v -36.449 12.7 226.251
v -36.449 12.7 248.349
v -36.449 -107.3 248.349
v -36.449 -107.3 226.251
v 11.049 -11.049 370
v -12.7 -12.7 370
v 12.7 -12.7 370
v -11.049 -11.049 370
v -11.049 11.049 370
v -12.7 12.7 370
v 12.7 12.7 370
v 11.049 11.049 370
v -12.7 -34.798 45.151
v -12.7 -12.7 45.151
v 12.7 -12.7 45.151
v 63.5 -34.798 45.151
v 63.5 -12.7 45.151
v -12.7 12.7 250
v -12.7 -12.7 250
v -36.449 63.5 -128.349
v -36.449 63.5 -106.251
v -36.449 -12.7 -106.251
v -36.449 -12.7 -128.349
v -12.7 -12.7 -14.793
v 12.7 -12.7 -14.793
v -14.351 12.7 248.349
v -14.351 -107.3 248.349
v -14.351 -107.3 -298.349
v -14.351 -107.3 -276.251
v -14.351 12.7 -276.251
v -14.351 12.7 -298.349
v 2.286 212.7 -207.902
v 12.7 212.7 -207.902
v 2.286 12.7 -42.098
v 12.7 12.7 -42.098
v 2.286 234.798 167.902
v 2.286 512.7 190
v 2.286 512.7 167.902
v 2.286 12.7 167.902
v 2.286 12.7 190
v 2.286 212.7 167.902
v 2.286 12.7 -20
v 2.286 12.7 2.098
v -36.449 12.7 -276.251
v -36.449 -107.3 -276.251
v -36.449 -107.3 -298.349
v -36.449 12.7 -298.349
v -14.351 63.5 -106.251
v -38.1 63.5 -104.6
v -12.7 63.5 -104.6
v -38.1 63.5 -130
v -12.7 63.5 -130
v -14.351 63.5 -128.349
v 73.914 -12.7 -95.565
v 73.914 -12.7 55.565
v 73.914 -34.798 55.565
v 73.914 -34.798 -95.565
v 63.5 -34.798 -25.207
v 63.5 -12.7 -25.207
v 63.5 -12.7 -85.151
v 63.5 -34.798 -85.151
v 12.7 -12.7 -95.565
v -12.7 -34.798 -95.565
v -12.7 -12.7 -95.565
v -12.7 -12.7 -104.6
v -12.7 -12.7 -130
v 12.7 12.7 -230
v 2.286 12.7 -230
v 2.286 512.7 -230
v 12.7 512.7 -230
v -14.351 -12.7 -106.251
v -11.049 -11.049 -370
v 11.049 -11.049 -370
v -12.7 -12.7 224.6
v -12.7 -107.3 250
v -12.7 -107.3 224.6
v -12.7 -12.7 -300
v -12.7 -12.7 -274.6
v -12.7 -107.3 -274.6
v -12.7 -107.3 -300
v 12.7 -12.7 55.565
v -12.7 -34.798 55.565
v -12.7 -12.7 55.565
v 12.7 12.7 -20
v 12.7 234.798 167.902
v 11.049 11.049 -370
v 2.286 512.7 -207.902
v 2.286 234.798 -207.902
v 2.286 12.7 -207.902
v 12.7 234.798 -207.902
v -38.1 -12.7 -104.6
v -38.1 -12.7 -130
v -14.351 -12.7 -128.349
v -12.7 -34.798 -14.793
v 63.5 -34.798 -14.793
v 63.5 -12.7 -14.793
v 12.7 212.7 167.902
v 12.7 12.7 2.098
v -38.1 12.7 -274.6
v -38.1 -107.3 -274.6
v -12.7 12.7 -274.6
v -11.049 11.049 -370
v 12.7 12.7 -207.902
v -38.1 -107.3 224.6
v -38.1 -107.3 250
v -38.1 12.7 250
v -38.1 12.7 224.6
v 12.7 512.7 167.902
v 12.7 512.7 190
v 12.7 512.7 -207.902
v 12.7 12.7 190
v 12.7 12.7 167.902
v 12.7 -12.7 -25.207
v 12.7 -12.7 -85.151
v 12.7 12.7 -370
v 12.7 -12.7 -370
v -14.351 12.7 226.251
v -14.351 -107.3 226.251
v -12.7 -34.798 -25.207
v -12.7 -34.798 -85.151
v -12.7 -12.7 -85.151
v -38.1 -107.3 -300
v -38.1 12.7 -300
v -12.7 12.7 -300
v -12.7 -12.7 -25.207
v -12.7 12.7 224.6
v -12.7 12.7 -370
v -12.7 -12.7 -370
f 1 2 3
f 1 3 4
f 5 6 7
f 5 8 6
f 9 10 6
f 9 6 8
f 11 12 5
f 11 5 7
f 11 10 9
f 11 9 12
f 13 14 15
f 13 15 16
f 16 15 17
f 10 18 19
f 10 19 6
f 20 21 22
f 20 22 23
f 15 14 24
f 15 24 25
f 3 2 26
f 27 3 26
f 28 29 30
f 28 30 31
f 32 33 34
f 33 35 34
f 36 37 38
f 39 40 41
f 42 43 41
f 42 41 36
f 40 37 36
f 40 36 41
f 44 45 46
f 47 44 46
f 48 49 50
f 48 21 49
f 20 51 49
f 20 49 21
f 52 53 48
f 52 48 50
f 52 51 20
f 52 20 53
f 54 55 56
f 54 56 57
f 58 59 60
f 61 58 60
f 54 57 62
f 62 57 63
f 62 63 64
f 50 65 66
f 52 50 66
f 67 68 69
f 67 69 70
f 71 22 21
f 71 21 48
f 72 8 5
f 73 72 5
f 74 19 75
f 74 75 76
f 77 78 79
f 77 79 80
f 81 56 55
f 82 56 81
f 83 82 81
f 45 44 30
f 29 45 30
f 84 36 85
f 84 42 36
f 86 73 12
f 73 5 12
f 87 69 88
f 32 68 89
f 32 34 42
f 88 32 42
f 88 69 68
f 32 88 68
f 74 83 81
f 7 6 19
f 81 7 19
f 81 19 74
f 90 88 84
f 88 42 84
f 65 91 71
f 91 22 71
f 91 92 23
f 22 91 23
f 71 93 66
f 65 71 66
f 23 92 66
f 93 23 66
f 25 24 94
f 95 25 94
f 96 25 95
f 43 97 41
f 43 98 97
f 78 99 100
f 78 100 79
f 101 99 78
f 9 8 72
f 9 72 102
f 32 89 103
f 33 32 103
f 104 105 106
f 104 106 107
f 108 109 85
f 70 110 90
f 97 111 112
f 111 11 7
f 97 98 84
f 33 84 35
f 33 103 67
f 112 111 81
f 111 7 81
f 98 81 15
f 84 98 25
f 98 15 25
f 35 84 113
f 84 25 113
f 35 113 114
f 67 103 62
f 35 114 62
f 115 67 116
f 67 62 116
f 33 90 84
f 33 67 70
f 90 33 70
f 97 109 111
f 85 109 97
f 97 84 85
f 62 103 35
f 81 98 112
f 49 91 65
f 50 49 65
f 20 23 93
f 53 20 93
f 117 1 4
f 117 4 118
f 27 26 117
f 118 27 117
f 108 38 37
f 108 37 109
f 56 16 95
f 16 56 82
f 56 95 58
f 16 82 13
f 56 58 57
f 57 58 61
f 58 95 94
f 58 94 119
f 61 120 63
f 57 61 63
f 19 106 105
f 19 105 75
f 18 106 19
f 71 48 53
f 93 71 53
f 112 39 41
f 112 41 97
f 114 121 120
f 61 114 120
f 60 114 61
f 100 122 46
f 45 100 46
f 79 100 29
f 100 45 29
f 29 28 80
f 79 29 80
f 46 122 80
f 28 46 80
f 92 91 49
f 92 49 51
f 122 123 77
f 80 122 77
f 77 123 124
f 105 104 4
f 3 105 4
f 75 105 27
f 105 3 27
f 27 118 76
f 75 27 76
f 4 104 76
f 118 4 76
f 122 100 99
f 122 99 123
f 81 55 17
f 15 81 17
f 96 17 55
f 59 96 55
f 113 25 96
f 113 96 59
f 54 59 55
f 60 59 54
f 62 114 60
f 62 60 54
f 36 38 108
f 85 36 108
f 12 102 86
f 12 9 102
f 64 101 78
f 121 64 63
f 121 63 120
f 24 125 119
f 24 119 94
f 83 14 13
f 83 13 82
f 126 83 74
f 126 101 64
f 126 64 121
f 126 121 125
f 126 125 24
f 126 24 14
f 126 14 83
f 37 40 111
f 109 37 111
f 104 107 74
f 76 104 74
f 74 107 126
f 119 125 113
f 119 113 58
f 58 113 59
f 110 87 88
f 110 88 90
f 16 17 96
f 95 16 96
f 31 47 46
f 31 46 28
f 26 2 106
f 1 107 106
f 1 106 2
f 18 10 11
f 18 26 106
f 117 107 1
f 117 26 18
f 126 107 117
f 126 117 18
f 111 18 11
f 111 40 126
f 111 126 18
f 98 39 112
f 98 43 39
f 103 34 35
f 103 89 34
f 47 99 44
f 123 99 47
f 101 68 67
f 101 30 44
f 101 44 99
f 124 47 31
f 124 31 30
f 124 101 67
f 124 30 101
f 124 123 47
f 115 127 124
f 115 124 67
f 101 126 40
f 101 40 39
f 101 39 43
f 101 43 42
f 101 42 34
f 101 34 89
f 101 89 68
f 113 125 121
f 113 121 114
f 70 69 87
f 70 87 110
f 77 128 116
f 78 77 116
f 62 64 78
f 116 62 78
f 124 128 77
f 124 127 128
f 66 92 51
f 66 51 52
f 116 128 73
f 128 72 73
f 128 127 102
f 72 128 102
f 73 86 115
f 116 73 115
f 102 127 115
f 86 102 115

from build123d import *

# Parameters (mm, degrees)
SKETCH1_W                = 25.4
SKETCH1_H                = 25.4
SKETCH1_W_2              = 22.098
SKETCH1_H_2              = 22.098
BOSS_EXTRUDE1_DEPTH      = 370
SKETCH2_W                = 10.414
SKETCH2_H                = 22.098
BOSS_EXTRUDE2_DEPTH      = 500
SKETCH11_W               = 76.2
SKETCH11_H               = 10.414
BOSS_EXTRUDE3_DEPTH      = 22.098
SKETCH13_W               = 151.13
SKETCH13_H               = 22.098
BOSS_EXTRUDE4_DEPTH      = 10.414
SKETCH14_W               = 25.4
SKETCH14_H               = 25.4
SKETCH14_W_2             = 22.098
SKETCH14_H_2             = 22.098
BOSS_EXTRUDE5_DEPTH      = 120
BOSS_EXTRUDE6_DEPTH      = 50.8
BOSS_EXTRUDE6_DEPTH_BACK = 25.4
SKETCH15_W               = 25.4
SKETCH15_H               = 25.4
SKETCH15_W_2             = 22.098
SKETCH15_H_2             = 22.098


with BuildPart() as part:
    # Sketch1 → Boss-Extrude1 (new, symmetric)
    with BuildSketch(Plane.XY):
        Rectangle(SKETCH1_W, SKETCH1_H)
        Rectangle(SKETCH1_W_2, SKETCH1_H_2, mode=Mode.SUBTRACT)
    extrude(amount=BOSS_EXTRUDE1_DEPTH, both=True)

    # Sketch2 → Boss-Extrude2 (add)
    with BuildSketch(Plane(origin=(0, 12.7, 0), x_dir=(1, 0, 0), z_dir=(0, 1, 0))):
        with Locations((7.493, -178.951)):
            Rectangle(SKETCH2_W, SKETCH2_H)
        with Locations((7.493, 218.951)):
            Rectangle(SKETCH2_W, SKETCH2_H)
    extrude(amount=BOSS_EXTRUDE2_DEPTH)

    # Sketch3 → Loft3 section 0
    with BuildSketch(Plane(origin=(0, 0, 167.902), x_dir=(-1, 0, 0), z_dir=(0, 0, -1))):
        with BuildLine():
            Line((-2.286, 234.798), (-12.7, 234.798))
            Line((-12.7, 234.798), (-12.7, 212.7))
            Line((-12.7, 212.7), (-2.286, 212.7))
            Line((-2.286, 212.7), (-2.286, 234.798))
        make_face()
    # Sketch4 → Loft3 section 1
    with BuildSketch(Plane(origin=(0, 12.7, 0), x_dir=(1, 0, 0), z_dir=(0, 1, 0))):
        with BuildLine():
            Line((2.286, 20), (12.7, 20))
            Line((12.7, 20), (12.7, -2.098))
            Line((12.7, -2.098), (2.286, -2.098))
            Line((2.286, -2.098), (2.286, 20))
        make_face()
    loft3 = loft()

    # Mirror2: Loft3 across plane
    add(loft3.mirror(Plane.XY.offset(-20)))

    # Sketch11 → Boss-Extrude3 (add)
    with BuildSketch(Plane.XZ.offset(12.7)):
        with Locations((25.4, -20)):
            Rectangle(SKETCH11_W, SKETCH11_H)
        with Locations((25.4, 50.358)):
            Rectangle(SKETCH11_W, SKETCH11_H)
        with Locations((25.4, -90.358)):
            Rectangle(SKETCH11_W, SKETCH11_H)
    extrude(amount=BOSS_EXTRUDE3_DEPTH)

    # Sketch13 → Boss-Extrude4 (add)
    with BuildSketch(Plane(origin=(63.5, 0, 0), x_dir=(0, 0, -1), z_dir=(1, 0, 0))):
        with Locations((20, -23.749)):
            Rectangle(SKETCH13_W, SKETCH13_H)
    extrude(amount=BOSS_EXTRUDE4_DEPTH)

    # Sketch14 → Boss-Extrude5 (add)
    # profile 1 of 2: a face of its own
    with BuildSketch(Plane(origin=(0, 12.7, 0), x_dir=(1, 0, 0), z_dir=(0, 1, 0))):
        with Locations((-25.4, -237.3)):
            Rectangle(SKETCH14_W, SKETCH14_H)
        with Locations((-25.4, -237.3)):
            Rectangle(SKETCH14_W_2, SKETCH14_H_2, mode=Mode.SUBTRACT)
    # profile 2 of 2: a face of its own
    with BuildSketch(Plane(origin=(0, 12.7, 0), x_dir=(1, 0, 0), z_dir=(0, 1, 0))):
        with Locations((-25.4, 287.3)):
            Rectangle(SKETCH14_W, SKETCH14_H)
        with Locations((-25.4, 287.3)):
            Rectangle(SKETCH14_W_2, SKETCH14_H_2, mode=Mode.SUBTRACT)
    extrude(amount=-BOSS_EXTRUDE5_DEPTH)


with BuildPart() as body_2:
    # Sketch15 → Boss-Extrude6 (new, two sides: drawn at the far end of the back side and taken through both)
    with BuildSketch(Plane(origin=(0, 12.7, 0), x_dir=(1, 0, 0), z_dir=(0, 1, 0)).offset(-BOSS_EXTRUDE6_DEPTH_BACK)):
        with Locations((-25.4, 117.3)):
            Rectangle(SKETCH15_W, SKETCH15_H)
        with Locations((-25.4, 117.3)):
            Rectangle(SKETCH15_W_2, SKETCH15_H_2, mode=Mode.SUBTRACT)
    extrude(amount=BOSS_EXTRUDE6_DEPTH + BOSS_EXTRUDE6_DEPTH_BACK)


solid = Compound([part.part, body_2.part])
